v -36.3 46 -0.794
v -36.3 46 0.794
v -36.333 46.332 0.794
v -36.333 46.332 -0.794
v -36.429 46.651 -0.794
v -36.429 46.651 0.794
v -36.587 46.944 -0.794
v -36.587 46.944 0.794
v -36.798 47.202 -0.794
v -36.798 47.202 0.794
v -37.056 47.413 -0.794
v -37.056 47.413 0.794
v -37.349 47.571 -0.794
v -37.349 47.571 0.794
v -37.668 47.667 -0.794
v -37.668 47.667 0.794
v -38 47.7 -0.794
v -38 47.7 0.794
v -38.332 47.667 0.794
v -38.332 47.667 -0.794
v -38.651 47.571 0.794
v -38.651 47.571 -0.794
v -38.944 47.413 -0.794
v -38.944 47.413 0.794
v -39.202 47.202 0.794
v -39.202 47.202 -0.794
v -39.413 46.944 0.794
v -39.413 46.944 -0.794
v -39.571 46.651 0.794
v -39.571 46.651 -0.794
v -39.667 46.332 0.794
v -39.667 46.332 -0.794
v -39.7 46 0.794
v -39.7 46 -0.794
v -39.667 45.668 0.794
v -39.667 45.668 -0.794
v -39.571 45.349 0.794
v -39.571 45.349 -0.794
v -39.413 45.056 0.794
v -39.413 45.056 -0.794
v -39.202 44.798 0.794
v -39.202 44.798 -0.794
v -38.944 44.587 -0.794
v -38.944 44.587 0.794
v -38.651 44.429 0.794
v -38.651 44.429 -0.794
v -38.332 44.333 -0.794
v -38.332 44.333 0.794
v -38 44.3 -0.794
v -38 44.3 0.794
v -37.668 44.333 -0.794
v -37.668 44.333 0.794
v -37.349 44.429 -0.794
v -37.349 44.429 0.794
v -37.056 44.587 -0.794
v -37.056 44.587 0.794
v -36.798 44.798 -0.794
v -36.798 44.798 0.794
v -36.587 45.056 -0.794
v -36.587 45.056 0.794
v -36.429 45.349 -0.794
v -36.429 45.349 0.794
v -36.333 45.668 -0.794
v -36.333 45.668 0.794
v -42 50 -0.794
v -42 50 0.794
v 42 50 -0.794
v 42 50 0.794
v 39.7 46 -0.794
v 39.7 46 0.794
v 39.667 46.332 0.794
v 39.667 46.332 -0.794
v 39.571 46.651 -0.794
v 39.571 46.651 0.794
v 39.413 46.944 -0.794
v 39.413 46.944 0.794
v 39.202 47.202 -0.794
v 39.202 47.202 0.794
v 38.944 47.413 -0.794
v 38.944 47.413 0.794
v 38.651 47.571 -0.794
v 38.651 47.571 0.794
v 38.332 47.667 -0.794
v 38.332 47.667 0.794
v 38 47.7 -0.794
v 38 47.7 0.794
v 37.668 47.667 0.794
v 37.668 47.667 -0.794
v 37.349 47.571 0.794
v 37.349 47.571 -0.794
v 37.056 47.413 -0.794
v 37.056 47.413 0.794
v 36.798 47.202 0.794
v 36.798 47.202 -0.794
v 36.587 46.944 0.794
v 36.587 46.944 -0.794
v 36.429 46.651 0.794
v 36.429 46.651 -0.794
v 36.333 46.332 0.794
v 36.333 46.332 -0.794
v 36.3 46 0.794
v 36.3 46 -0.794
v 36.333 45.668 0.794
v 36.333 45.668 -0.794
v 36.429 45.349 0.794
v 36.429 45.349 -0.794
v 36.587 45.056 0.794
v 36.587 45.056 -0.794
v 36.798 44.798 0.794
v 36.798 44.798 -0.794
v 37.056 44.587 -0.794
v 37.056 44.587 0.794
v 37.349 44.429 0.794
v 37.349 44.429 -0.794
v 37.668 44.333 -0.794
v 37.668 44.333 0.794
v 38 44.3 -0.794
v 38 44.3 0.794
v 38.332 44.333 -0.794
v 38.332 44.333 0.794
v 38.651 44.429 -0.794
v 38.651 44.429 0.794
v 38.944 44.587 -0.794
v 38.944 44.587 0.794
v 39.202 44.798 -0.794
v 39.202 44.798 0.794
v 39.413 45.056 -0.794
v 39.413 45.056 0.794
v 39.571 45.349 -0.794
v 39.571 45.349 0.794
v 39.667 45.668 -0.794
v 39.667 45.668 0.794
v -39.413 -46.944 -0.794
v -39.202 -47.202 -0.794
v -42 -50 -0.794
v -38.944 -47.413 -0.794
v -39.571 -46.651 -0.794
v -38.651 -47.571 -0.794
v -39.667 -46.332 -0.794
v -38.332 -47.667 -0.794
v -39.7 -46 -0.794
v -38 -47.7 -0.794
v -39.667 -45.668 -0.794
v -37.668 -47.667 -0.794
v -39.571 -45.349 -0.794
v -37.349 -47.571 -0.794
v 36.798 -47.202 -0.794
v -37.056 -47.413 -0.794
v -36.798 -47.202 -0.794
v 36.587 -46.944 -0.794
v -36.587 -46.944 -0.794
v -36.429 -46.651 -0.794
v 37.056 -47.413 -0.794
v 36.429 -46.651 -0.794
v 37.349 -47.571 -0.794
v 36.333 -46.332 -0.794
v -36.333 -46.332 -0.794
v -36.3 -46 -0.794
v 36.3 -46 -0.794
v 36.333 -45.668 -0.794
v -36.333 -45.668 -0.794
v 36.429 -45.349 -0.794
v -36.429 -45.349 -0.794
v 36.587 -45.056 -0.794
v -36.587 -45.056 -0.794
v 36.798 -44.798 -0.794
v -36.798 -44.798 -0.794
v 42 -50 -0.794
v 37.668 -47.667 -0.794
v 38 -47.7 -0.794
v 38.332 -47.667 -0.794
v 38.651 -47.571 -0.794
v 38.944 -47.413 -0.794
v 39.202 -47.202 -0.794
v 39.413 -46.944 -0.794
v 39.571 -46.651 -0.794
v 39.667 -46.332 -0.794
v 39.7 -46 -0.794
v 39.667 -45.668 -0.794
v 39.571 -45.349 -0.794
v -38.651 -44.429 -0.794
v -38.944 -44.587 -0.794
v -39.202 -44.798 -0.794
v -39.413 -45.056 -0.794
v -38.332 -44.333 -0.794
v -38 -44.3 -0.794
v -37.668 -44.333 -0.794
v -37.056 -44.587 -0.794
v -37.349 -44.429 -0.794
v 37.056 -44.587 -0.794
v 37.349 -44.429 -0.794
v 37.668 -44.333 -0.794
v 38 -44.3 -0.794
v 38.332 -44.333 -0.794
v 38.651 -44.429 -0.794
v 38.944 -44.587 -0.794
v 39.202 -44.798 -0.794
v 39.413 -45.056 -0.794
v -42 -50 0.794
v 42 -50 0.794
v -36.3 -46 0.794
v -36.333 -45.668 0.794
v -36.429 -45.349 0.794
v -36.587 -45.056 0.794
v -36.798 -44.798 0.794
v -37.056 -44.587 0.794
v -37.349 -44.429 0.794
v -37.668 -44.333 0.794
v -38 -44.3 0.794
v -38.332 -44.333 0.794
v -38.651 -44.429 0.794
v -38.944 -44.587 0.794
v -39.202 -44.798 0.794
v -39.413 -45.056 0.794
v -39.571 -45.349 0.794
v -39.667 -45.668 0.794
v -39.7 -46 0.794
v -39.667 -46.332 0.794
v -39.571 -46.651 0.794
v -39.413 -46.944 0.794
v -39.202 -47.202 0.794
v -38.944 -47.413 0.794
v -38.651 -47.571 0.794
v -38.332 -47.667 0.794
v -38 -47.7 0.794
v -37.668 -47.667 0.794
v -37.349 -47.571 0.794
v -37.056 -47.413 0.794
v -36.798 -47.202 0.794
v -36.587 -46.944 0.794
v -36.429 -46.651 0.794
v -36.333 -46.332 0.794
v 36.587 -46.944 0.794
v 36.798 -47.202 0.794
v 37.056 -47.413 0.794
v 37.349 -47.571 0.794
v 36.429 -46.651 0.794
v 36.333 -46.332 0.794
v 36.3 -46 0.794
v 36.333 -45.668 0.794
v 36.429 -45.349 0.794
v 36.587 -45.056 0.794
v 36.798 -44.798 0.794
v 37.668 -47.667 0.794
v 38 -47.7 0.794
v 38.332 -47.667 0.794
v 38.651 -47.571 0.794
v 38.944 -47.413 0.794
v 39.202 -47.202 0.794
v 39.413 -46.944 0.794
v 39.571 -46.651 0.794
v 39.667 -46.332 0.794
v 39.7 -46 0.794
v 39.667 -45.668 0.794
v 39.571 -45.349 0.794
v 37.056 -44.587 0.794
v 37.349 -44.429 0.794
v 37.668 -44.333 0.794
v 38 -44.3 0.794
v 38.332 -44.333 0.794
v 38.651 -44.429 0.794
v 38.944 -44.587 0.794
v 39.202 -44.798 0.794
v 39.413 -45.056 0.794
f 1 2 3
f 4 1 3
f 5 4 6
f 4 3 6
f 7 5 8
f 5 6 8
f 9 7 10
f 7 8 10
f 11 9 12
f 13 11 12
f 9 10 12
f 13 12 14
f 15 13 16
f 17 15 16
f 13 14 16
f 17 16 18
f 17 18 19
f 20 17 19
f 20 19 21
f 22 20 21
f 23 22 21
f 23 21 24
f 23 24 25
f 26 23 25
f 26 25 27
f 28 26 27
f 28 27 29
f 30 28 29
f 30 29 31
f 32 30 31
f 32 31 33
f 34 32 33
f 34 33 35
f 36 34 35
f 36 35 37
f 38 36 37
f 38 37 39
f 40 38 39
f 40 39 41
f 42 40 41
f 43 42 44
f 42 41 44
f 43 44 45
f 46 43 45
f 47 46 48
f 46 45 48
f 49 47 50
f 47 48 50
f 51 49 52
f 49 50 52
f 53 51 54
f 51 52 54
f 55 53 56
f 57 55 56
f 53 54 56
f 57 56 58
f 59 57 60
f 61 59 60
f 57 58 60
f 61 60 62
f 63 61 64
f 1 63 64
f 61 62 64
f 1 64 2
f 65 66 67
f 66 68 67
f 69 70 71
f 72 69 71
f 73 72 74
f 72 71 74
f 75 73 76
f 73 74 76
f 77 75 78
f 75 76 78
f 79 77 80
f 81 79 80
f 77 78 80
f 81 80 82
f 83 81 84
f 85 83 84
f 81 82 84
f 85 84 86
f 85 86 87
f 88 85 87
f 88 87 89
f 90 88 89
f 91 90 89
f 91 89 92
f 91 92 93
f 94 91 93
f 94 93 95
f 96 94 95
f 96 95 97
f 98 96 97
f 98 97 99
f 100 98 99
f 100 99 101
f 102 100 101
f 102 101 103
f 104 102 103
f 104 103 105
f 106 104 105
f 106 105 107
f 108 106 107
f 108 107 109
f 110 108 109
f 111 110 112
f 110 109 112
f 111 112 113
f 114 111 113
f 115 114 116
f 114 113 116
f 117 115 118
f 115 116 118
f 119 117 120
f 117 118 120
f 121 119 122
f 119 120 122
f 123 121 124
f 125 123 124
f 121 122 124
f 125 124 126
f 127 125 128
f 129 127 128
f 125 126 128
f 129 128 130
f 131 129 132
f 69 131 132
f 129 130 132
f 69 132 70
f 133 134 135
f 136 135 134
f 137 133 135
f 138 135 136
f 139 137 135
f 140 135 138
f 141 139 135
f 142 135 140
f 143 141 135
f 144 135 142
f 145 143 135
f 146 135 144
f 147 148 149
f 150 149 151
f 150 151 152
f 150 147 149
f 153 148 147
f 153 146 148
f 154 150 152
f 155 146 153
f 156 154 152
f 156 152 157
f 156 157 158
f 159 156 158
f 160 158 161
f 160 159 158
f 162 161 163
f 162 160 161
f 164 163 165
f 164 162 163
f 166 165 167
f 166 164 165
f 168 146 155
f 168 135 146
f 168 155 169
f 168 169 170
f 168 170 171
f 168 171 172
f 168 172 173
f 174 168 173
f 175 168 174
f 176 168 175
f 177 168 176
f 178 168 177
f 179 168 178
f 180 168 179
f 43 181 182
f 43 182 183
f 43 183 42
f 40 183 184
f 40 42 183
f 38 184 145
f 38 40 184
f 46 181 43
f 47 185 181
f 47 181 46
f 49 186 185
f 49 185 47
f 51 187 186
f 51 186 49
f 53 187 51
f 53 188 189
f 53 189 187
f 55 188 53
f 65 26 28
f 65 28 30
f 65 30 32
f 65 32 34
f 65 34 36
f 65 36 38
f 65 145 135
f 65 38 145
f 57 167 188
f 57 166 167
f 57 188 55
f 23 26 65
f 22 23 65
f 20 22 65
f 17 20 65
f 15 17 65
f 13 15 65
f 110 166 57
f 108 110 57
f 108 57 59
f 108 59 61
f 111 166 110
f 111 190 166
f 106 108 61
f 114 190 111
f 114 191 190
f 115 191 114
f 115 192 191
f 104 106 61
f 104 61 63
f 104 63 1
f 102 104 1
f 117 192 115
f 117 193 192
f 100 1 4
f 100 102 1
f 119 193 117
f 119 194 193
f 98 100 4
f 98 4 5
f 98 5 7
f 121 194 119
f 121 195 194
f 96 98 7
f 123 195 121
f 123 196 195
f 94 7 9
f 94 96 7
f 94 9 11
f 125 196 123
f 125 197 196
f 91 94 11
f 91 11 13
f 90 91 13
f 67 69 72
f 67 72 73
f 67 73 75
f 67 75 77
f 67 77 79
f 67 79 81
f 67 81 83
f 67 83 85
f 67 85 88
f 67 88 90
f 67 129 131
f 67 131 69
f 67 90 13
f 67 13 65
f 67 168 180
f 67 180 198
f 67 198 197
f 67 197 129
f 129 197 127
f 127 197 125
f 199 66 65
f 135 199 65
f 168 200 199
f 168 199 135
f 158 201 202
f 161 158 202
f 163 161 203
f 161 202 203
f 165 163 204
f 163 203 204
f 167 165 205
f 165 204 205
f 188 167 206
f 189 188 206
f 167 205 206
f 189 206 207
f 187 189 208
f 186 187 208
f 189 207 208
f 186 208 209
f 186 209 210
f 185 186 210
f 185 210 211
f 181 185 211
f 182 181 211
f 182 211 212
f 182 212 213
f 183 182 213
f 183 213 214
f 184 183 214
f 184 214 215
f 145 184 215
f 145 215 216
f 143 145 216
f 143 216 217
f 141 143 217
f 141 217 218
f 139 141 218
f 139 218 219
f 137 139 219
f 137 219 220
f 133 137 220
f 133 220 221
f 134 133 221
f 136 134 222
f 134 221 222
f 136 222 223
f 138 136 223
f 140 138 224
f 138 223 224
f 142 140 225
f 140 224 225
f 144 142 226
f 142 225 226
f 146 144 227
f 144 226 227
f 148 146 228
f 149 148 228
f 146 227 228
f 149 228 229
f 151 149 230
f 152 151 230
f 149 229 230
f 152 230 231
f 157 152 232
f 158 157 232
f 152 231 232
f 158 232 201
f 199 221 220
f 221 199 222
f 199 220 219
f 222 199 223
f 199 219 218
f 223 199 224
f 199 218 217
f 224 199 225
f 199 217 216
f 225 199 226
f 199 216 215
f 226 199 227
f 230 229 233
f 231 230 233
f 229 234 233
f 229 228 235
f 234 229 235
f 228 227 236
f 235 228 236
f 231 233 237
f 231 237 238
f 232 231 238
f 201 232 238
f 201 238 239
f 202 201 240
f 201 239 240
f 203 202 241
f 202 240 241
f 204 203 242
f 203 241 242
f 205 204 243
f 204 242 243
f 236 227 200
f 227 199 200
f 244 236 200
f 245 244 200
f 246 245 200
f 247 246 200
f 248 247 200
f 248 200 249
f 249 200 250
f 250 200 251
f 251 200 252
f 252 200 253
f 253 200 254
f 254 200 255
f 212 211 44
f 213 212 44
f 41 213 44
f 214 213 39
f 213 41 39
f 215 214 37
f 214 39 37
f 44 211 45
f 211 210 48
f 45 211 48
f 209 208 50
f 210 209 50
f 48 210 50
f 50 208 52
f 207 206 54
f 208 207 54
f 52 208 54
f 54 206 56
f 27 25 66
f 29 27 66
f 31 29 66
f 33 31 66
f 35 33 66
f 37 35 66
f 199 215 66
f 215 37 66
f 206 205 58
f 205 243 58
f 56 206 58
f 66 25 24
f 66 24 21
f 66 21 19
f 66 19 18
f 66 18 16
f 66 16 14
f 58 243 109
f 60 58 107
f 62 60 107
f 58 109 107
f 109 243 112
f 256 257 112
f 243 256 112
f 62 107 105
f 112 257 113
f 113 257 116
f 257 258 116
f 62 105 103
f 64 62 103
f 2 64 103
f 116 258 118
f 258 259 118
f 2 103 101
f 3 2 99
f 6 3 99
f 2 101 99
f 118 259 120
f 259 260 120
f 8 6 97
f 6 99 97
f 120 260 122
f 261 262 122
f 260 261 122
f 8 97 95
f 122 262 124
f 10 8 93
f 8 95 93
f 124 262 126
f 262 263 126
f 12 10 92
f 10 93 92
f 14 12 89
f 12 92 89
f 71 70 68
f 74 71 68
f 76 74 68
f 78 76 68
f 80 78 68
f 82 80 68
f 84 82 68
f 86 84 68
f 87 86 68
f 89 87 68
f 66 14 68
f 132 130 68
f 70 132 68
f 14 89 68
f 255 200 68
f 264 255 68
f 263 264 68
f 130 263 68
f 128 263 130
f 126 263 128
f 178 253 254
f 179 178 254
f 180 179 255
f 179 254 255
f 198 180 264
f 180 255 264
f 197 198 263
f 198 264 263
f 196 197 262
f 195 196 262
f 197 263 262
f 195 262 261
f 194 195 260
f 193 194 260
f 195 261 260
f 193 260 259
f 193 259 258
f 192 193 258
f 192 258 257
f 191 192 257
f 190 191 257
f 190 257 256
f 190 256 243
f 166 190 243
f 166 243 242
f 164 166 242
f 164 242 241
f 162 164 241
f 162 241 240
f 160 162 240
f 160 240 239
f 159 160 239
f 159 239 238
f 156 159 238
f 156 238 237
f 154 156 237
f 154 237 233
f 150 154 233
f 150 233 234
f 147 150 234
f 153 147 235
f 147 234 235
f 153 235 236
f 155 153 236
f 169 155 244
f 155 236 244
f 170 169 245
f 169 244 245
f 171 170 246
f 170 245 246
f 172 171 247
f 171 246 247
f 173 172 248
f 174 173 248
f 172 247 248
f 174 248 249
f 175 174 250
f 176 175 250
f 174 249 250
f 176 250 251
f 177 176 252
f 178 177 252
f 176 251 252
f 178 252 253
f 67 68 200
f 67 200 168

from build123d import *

# Parameters (mm, degrees)
SKETCH1_W           = 1.5875
SKETCH1_H           = 99.999999898
BOSS_EXTRUDE1_DEPTH = 41.999999947
SKETCH2_R           = 1.700000029
CUT_EXTRUDE1_DEPTH  = 66.318604905


with BuildPart() as part:
    # Sketch1 → Boss-Extrude1 (new, symmetric)
    with BuildSketch(Plane(origin=(0, 0, 0), x_dir=(0, 0, -1), z_dir=(1, 0, 0))):
        Rectangle(SKETCH1_W, SKETCH1_H)
    extrude(amount=BOSS_EXTRUDE1_DEPTH, both=True)

    # Sketch2 → Cut-Extrude1 (cut, through all)
    with BuildSketch(Plane.XY.offset(0.79375)):
        with Locations((-37.999999819, 45.999999821)):
            Circle(SKETCH2_R)
        with Locations((37.999999819, 45.999999821)):
            Circle(SKETCH2_R)
        with Locations((37.999999819, -45.999999821)):
            Circle(SKETCH2_R)
        with Locations((-37.999999819, -45.999999821)):
            Circle(SKETCH2_R)
    extrude(amount=-CUT_EXTRUDE1_DEPTH, mode=Mode.SUBTRACT)


solid = part.part
